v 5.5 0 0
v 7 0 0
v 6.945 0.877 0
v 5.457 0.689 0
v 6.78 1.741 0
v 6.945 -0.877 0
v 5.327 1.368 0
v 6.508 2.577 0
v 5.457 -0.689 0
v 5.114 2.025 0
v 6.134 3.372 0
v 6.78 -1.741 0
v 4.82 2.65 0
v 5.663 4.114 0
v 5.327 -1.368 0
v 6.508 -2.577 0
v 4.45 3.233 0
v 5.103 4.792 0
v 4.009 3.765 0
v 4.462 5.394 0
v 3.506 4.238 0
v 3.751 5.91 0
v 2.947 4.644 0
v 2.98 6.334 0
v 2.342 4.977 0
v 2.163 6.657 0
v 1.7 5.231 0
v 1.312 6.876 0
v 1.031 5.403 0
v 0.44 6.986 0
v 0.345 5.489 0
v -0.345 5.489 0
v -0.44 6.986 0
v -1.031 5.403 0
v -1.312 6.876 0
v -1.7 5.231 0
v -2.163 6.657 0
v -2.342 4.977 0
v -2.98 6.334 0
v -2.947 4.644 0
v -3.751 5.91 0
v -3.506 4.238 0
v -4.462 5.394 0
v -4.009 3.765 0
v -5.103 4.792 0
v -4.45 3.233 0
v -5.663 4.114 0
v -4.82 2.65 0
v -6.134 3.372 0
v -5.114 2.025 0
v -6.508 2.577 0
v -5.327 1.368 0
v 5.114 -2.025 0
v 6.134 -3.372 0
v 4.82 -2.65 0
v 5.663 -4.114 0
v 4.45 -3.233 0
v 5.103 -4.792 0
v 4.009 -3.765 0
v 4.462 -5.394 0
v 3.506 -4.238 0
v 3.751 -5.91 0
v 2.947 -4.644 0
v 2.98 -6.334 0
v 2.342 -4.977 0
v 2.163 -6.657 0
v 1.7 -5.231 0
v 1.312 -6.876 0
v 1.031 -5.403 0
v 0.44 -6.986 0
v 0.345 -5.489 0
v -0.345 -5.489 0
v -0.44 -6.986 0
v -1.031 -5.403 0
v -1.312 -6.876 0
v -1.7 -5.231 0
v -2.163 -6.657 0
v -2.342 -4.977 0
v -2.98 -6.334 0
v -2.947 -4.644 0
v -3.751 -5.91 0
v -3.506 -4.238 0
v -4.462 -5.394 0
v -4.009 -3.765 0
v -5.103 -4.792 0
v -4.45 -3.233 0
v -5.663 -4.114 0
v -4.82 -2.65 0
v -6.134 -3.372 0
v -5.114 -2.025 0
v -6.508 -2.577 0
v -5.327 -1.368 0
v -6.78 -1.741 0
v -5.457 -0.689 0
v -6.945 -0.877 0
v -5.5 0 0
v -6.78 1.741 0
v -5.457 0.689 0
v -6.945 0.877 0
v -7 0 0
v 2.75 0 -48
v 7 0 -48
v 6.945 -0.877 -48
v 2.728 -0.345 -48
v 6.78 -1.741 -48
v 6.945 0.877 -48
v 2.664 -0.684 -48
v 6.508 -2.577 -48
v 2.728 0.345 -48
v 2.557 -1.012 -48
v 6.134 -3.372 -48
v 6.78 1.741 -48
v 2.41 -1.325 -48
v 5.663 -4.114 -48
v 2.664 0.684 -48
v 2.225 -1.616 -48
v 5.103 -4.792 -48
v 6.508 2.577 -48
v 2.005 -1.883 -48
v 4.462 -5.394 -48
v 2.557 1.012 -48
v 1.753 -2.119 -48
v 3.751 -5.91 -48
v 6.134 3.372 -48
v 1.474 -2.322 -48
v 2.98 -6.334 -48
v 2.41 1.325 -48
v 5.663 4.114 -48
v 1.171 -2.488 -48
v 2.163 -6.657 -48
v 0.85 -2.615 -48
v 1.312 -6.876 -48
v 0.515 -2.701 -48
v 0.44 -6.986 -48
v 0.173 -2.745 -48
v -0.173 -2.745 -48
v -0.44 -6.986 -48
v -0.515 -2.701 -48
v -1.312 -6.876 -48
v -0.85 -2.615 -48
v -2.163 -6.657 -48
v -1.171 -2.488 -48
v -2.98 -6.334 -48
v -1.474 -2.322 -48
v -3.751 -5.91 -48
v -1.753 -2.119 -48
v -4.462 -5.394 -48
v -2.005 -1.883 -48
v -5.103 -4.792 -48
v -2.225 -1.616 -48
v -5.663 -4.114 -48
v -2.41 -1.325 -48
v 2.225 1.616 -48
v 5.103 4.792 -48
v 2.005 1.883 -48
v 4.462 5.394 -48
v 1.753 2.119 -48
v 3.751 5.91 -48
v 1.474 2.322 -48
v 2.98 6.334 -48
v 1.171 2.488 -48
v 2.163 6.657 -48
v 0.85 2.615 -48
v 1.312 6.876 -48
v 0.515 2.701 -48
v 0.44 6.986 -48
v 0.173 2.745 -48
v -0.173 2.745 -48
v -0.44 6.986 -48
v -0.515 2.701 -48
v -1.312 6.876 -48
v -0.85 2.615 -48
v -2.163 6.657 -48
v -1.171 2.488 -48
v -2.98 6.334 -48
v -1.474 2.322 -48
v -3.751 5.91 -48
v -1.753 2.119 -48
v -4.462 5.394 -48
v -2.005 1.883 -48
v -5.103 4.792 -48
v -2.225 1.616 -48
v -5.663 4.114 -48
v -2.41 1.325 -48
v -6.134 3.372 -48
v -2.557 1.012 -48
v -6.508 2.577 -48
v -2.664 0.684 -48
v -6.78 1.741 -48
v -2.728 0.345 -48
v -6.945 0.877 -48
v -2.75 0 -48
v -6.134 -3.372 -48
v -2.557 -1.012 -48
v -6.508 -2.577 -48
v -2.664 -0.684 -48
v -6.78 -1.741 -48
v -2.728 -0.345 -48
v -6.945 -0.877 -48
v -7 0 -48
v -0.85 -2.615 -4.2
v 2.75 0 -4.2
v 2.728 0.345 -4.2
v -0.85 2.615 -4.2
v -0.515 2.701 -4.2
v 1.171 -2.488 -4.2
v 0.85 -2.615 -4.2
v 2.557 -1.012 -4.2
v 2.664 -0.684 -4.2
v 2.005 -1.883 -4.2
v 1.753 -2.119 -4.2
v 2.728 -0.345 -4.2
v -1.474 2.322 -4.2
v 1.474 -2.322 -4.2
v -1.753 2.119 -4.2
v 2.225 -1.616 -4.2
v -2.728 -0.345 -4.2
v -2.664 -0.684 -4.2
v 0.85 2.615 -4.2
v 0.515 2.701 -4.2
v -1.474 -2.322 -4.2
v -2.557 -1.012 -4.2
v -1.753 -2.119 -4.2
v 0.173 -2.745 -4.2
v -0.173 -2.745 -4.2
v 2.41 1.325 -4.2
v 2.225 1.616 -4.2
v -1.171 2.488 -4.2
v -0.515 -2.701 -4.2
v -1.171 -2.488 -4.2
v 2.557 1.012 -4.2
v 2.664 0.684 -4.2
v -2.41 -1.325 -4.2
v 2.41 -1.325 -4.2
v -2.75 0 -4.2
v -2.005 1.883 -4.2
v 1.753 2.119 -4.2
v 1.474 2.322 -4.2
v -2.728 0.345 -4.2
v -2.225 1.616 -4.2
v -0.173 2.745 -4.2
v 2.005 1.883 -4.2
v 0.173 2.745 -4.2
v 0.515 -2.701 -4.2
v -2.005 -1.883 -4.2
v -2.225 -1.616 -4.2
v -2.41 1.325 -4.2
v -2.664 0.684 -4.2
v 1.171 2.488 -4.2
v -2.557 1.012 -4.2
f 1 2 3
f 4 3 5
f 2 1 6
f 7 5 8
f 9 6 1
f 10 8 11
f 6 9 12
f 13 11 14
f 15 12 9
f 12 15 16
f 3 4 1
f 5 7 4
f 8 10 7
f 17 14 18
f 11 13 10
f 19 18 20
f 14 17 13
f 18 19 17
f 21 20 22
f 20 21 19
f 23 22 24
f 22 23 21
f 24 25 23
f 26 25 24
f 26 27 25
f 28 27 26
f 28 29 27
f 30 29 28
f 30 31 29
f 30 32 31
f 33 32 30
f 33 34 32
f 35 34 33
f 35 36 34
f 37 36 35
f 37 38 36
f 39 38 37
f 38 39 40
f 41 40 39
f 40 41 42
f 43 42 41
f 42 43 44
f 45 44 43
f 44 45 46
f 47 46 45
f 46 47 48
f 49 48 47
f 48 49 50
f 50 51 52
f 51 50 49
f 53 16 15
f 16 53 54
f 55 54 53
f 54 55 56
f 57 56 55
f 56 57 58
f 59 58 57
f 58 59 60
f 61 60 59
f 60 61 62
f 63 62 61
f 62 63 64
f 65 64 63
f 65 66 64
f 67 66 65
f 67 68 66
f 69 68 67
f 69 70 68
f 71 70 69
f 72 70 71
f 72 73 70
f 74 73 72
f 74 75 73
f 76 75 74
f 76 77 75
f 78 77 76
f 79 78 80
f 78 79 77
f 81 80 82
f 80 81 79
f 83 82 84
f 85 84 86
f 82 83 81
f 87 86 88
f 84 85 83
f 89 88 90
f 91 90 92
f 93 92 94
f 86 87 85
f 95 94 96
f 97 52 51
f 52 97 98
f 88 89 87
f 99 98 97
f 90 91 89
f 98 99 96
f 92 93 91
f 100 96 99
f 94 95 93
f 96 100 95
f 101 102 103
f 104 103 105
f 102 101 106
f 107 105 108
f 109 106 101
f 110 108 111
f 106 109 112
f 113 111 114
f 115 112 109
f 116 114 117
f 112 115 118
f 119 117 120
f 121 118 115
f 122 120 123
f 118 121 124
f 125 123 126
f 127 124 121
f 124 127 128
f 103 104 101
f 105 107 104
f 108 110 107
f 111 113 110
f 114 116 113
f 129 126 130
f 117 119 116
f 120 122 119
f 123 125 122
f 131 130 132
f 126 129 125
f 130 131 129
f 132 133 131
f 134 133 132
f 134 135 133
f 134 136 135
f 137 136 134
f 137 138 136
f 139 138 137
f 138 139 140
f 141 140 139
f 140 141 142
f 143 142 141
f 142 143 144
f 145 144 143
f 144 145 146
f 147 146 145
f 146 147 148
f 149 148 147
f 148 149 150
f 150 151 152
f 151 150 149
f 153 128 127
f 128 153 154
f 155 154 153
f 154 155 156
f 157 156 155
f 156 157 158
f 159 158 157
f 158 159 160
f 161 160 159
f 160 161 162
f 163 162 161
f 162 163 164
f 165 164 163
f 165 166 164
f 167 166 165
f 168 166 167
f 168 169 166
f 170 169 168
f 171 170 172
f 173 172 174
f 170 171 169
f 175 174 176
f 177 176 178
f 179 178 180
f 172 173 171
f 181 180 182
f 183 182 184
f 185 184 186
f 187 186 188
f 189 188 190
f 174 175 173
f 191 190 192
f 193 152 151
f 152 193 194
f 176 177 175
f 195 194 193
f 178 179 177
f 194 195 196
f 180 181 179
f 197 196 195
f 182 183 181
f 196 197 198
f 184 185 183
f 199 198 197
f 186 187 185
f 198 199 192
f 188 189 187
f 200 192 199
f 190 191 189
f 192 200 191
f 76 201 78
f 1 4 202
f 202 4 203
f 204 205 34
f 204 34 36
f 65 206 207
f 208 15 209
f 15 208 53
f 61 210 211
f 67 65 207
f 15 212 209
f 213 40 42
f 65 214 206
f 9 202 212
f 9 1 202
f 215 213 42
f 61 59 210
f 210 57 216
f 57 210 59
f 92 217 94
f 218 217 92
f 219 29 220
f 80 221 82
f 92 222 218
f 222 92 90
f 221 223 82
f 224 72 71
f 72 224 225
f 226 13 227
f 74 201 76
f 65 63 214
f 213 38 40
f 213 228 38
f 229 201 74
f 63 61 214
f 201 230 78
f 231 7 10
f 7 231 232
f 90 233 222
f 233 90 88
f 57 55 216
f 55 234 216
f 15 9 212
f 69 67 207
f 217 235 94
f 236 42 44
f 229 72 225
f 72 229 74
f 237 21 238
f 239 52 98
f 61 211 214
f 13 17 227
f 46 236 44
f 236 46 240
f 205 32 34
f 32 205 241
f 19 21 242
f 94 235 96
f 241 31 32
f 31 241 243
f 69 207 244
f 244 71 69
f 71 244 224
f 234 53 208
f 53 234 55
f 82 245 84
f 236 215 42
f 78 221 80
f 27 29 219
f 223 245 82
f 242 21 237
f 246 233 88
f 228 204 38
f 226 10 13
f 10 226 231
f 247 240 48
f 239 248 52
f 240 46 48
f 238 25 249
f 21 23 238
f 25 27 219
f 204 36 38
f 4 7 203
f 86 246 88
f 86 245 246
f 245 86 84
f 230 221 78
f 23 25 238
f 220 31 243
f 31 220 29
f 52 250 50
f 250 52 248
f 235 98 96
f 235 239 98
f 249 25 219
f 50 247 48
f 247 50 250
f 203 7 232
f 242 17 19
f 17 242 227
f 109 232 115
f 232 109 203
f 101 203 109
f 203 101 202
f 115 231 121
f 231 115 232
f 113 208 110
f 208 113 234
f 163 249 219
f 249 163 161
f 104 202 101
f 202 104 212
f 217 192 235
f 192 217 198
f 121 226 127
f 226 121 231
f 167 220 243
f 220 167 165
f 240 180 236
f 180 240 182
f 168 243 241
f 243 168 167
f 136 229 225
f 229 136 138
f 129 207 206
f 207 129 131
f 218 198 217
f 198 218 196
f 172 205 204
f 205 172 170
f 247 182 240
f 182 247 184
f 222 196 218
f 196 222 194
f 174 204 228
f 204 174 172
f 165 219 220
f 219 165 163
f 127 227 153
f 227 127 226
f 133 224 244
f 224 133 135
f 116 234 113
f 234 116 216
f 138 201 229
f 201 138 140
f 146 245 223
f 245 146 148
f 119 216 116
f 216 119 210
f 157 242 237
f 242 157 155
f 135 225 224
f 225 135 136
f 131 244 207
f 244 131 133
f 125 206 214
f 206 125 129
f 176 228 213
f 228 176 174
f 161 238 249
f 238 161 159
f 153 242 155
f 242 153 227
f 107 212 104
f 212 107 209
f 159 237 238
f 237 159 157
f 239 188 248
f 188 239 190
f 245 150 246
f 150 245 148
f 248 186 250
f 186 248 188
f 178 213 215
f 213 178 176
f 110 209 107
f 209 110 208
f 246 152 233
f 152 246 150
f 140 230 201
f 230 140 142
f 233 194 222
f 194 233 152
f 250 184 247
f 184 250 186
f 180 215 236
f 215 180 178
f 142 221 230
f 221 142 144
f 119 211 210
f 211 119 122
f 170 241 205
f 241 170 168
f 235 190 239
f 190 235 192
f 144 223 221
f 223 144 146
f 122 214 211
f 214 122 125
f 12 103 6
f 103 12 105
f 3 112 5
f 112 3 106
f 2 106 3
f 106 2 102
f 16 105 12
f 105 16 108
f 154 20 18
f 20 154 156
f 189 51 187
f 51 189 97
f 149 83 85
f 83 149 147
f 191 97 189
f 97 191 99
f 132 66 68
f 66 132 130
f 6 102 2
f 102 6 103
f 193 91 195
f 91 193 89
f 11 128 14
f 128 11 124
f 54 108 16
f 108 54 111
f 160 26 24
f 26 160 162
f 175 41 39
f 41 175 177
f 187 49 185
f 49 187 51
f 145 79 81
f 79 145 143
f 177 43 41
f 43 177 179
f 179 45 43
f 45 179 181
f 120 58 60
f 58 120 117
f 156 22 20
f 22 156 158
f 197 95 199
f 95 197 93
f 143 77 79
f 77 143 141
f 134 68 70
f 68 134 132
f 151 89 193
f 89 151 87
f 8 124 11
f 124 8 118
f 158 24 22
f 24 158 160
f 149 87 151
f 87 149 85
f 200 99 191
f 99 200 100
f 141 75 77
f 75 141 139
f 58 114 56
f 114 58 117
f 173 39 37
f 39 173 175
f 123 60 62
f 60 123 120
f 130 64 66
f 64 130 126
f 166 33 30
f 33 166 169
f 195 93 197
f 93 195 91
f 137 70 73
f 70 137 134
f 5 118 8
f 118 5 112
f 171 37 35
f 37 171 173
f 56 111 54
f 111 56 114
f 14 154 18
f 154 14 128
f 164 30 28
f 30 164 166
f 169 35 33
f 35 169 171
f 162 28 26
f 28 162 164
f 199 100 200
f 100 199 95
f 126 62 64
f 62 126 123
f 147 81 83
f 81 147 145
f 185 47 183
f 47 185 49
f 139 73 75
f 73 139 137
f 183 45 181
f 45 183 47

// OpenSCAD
$fn = 50;


difference() {
	union() {
		translate(v = [0, 0, -48.0000000000]) {
			cylinder(h = 48, r = 7.0000000000);
		}
	}
	union() {
		translate(v = [0, 0, 0]) {
			rotate(a = [0, 0, 0]) {
				difference() {
					union() {
						#translate(v = [0, 0, -48.0000000000]) {
							cylinder(h = 48, r = 2.2500000000);
						}
						#translate(v = [0, 0, -4.2000000000]) {
							cylinder(h = 4.2000000000, r1 = 2.7500000000, r2 = 5.5000000000);
						}
						#translate(v = [0, 0, -48.0000000000]) {
							cylinder(h = 48, r = 2.7500000000);
						}
						#translate(v = [0, 0, -48.0000000000]) {
							cylinder(h = 48, r = 2.2500000000);
						}
					}
					union();
				}
			}
		}
	}
}
